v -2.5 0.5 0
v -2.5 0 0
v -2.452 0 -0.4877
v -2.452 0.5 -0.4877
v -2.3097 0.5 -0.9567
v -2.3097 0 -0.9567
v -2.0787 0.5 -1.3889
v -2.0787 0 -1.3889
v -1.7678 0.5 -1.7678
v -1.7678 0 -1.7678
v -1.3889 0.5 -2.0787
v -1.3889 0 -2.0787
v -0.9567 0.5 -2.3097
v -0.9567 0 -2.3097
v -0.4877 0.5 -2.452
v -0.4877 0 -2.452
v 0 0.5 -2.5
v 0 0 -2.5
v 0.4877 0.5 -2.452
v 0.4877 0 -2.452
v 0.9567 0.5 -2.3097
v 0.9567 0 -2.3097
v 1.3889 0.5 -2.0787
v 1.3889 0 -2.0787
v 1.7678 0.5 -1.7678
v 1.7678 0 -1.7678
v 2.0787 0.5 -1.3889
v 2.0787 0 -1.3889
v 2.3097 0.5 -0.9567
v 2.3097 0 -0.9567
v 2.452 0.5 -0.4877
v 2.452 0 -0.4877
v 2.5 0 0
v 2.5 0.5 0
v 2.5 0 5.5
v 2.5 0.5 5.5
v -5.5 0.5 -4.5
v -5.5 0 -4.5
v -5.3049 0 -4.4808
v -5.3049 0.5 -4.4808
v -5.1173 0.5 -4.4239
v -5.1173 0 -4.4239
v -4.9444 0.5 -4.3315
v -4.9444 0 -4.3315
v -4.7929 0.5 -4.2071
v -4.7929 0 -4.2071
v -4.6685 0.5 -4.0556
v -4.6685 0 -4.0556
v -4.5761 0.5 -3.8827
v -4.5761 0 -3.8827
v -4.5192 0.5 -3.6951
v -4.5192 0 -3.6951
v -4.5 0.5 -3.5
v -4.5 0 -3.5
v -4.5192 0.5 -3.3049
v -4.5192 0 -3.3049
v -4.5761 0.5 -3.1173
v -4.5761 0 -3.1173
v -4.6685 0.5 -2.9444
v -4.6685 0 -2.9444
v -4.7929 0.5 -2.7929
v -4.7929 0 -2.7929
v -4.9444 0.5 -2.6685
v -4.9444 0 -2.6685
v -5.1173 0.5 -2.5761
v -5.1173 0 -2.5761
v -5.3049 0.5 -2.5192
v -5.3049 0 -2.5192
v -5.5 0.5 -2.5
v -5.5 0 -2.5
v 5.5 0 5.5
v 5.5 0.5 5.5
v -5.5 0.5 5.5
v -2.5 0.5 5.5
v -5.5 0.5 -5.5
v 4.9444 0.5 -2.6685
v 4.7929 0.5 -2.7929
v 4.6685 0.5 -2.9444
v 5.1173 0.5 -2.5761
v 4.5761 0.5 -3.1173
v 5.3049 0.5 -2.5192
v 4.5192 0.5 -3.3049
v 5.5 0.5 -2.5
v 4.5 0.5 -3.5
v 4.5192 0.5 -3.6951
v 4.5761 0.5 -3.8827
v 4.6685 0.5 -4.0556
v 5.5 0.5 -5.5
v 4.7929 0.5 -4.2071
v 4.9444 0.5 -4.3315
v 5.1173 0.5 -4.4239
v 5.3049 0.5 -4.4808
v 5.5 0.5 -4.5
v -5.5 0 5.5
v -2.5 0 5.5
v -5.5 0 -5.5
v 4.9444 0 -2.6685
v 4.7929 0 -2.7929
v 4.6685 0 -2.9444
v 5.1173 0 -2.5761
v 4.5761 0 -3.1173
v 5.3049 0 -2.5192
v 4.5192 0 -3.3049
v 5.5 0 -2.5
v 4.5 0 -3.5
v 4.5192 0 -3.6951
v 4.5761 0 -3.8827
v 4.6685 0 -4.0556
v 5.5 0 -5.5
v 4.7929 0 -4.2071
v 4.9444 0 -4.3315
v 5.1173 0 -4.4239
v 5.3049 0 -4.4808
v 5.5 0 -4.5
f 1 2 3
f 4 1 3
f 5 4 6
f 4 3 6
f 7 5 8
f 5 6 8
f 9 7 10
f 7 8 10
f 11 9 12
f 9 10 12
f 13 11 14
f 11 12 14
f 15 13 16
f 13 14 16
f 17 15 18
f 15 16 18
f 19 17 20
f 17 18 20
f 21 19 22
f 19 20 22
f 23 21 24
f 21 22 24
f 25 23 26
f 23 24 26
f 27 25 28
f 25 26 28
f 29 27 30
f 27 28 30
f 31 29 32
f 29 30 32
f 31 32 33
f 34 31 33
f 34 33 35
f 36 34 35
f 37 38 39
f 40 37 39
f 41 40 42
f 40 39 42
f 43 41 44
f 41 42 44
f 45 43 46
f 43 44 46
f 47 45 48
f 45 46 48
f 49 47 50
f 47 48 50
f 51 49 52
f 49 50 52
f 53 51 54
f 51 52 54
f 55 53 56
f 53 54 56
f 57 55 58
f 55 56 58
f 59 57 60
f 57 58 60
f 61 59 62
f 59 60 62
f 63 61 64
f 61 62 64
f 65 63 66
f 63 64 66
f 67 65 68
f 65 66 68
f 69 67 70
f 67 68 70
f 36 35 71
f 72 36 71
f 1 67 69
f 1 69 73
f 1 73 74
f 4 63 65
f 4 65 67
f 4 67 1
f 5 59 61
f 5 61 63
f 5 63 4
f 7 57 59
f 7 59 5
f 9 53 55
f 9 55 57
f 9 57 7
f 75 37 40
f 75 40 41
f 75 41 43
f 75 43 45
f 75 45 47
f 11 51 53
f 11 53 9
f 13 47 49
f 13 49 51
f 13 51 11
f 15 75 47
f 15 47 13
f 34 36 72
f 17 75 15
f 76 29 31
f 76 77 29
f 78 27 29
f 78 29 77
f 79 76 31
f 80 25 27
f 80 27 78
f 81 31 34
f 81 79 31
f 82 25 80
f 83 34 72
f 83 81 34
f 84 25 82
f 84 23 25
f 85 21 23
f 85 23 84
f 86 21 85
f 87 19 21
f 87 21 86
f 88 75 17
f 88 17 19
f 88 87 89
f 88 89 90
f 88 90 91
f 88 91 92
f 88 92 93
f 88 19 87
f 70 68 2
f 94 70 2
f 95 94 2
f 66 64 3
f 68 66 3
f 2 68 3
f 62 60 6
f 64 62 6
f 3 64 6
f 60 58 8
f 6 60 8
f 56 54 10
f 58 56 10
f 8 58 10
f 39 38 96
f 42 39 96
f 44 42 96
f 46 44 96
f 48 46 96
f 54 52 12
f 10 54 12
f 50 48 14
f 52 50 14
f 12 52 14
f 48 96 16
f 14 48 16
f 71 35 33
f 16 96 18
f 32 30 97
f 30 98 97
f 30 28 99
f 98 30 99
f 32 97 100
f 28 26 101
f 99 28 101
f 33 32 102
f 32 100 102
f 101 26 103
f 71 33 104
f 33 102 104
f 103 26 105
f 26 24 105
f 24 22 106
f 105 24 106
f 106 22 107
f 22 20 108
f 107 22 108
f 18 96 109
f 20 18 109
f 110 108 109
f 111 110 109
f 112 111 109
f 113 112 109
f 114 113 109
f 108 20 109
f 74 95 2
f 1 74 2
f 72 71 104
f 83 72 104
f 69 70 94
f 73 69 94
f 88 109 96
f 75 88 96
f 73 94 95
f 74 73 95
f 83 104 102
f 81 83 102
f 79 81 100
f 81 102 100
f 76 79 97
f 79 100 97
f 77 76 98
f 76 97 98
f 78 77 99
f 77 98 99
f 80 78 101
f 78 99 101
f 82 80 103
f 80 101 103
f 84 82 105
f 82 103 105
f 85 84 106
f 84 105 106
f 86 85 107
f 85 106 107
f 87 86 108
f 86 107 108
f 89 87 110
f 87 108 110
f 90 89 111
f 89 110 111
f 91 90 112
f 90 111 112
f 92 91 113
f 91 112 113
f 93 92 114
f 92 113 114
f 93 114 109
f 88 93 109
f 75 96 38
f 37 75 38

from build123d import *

# Parameters (mm, degrees)
BOSS_EXTRUDE1_DEPTH = 0.5


with BuildPart() as part:
    # Sketch1 → Boss-Extrude1 (new body)
    with BuildSketch(Plane(origin=(0, 0, 0), x_dir=(1, 0, 0), z_dir=(0, 1, 0))):
        with BuildLine():
            Line((-5.5, 5.5), (-5.5, 4.5))
            ThreePointArc((-5.5, 4.5), (-4.5, 3.5), (-5.5, 2.5))
            Line((-5.5, 2.5), (-5.5, -5.5))
            Line((-5.5, -5.5), (-2.5, -5.5))
            Line((-2.5, -5.5), (-2.5, 0))
            ThreePointArc((-2.5, 0), (0, 2.5), (2.5, 0))
            Line((2.5, 0), (2.5, -5.5))
            Line((2.5, -5.5), (5.5, -5.5))
            Line((5.5, -5.5), (5.5, 2.5))
            ThreePointArc((5.5, 2.5), (4.5, 3.5), (5.5, 4.5))
            Line((5.5, 4.5), (5.5, 5.5))
            Line((5.5, 5.5), (-5.5, 5.5))
        make_face()
    extrude(amount=BOSS_EXTRUDE1_DEPTH)


solid = part.part
